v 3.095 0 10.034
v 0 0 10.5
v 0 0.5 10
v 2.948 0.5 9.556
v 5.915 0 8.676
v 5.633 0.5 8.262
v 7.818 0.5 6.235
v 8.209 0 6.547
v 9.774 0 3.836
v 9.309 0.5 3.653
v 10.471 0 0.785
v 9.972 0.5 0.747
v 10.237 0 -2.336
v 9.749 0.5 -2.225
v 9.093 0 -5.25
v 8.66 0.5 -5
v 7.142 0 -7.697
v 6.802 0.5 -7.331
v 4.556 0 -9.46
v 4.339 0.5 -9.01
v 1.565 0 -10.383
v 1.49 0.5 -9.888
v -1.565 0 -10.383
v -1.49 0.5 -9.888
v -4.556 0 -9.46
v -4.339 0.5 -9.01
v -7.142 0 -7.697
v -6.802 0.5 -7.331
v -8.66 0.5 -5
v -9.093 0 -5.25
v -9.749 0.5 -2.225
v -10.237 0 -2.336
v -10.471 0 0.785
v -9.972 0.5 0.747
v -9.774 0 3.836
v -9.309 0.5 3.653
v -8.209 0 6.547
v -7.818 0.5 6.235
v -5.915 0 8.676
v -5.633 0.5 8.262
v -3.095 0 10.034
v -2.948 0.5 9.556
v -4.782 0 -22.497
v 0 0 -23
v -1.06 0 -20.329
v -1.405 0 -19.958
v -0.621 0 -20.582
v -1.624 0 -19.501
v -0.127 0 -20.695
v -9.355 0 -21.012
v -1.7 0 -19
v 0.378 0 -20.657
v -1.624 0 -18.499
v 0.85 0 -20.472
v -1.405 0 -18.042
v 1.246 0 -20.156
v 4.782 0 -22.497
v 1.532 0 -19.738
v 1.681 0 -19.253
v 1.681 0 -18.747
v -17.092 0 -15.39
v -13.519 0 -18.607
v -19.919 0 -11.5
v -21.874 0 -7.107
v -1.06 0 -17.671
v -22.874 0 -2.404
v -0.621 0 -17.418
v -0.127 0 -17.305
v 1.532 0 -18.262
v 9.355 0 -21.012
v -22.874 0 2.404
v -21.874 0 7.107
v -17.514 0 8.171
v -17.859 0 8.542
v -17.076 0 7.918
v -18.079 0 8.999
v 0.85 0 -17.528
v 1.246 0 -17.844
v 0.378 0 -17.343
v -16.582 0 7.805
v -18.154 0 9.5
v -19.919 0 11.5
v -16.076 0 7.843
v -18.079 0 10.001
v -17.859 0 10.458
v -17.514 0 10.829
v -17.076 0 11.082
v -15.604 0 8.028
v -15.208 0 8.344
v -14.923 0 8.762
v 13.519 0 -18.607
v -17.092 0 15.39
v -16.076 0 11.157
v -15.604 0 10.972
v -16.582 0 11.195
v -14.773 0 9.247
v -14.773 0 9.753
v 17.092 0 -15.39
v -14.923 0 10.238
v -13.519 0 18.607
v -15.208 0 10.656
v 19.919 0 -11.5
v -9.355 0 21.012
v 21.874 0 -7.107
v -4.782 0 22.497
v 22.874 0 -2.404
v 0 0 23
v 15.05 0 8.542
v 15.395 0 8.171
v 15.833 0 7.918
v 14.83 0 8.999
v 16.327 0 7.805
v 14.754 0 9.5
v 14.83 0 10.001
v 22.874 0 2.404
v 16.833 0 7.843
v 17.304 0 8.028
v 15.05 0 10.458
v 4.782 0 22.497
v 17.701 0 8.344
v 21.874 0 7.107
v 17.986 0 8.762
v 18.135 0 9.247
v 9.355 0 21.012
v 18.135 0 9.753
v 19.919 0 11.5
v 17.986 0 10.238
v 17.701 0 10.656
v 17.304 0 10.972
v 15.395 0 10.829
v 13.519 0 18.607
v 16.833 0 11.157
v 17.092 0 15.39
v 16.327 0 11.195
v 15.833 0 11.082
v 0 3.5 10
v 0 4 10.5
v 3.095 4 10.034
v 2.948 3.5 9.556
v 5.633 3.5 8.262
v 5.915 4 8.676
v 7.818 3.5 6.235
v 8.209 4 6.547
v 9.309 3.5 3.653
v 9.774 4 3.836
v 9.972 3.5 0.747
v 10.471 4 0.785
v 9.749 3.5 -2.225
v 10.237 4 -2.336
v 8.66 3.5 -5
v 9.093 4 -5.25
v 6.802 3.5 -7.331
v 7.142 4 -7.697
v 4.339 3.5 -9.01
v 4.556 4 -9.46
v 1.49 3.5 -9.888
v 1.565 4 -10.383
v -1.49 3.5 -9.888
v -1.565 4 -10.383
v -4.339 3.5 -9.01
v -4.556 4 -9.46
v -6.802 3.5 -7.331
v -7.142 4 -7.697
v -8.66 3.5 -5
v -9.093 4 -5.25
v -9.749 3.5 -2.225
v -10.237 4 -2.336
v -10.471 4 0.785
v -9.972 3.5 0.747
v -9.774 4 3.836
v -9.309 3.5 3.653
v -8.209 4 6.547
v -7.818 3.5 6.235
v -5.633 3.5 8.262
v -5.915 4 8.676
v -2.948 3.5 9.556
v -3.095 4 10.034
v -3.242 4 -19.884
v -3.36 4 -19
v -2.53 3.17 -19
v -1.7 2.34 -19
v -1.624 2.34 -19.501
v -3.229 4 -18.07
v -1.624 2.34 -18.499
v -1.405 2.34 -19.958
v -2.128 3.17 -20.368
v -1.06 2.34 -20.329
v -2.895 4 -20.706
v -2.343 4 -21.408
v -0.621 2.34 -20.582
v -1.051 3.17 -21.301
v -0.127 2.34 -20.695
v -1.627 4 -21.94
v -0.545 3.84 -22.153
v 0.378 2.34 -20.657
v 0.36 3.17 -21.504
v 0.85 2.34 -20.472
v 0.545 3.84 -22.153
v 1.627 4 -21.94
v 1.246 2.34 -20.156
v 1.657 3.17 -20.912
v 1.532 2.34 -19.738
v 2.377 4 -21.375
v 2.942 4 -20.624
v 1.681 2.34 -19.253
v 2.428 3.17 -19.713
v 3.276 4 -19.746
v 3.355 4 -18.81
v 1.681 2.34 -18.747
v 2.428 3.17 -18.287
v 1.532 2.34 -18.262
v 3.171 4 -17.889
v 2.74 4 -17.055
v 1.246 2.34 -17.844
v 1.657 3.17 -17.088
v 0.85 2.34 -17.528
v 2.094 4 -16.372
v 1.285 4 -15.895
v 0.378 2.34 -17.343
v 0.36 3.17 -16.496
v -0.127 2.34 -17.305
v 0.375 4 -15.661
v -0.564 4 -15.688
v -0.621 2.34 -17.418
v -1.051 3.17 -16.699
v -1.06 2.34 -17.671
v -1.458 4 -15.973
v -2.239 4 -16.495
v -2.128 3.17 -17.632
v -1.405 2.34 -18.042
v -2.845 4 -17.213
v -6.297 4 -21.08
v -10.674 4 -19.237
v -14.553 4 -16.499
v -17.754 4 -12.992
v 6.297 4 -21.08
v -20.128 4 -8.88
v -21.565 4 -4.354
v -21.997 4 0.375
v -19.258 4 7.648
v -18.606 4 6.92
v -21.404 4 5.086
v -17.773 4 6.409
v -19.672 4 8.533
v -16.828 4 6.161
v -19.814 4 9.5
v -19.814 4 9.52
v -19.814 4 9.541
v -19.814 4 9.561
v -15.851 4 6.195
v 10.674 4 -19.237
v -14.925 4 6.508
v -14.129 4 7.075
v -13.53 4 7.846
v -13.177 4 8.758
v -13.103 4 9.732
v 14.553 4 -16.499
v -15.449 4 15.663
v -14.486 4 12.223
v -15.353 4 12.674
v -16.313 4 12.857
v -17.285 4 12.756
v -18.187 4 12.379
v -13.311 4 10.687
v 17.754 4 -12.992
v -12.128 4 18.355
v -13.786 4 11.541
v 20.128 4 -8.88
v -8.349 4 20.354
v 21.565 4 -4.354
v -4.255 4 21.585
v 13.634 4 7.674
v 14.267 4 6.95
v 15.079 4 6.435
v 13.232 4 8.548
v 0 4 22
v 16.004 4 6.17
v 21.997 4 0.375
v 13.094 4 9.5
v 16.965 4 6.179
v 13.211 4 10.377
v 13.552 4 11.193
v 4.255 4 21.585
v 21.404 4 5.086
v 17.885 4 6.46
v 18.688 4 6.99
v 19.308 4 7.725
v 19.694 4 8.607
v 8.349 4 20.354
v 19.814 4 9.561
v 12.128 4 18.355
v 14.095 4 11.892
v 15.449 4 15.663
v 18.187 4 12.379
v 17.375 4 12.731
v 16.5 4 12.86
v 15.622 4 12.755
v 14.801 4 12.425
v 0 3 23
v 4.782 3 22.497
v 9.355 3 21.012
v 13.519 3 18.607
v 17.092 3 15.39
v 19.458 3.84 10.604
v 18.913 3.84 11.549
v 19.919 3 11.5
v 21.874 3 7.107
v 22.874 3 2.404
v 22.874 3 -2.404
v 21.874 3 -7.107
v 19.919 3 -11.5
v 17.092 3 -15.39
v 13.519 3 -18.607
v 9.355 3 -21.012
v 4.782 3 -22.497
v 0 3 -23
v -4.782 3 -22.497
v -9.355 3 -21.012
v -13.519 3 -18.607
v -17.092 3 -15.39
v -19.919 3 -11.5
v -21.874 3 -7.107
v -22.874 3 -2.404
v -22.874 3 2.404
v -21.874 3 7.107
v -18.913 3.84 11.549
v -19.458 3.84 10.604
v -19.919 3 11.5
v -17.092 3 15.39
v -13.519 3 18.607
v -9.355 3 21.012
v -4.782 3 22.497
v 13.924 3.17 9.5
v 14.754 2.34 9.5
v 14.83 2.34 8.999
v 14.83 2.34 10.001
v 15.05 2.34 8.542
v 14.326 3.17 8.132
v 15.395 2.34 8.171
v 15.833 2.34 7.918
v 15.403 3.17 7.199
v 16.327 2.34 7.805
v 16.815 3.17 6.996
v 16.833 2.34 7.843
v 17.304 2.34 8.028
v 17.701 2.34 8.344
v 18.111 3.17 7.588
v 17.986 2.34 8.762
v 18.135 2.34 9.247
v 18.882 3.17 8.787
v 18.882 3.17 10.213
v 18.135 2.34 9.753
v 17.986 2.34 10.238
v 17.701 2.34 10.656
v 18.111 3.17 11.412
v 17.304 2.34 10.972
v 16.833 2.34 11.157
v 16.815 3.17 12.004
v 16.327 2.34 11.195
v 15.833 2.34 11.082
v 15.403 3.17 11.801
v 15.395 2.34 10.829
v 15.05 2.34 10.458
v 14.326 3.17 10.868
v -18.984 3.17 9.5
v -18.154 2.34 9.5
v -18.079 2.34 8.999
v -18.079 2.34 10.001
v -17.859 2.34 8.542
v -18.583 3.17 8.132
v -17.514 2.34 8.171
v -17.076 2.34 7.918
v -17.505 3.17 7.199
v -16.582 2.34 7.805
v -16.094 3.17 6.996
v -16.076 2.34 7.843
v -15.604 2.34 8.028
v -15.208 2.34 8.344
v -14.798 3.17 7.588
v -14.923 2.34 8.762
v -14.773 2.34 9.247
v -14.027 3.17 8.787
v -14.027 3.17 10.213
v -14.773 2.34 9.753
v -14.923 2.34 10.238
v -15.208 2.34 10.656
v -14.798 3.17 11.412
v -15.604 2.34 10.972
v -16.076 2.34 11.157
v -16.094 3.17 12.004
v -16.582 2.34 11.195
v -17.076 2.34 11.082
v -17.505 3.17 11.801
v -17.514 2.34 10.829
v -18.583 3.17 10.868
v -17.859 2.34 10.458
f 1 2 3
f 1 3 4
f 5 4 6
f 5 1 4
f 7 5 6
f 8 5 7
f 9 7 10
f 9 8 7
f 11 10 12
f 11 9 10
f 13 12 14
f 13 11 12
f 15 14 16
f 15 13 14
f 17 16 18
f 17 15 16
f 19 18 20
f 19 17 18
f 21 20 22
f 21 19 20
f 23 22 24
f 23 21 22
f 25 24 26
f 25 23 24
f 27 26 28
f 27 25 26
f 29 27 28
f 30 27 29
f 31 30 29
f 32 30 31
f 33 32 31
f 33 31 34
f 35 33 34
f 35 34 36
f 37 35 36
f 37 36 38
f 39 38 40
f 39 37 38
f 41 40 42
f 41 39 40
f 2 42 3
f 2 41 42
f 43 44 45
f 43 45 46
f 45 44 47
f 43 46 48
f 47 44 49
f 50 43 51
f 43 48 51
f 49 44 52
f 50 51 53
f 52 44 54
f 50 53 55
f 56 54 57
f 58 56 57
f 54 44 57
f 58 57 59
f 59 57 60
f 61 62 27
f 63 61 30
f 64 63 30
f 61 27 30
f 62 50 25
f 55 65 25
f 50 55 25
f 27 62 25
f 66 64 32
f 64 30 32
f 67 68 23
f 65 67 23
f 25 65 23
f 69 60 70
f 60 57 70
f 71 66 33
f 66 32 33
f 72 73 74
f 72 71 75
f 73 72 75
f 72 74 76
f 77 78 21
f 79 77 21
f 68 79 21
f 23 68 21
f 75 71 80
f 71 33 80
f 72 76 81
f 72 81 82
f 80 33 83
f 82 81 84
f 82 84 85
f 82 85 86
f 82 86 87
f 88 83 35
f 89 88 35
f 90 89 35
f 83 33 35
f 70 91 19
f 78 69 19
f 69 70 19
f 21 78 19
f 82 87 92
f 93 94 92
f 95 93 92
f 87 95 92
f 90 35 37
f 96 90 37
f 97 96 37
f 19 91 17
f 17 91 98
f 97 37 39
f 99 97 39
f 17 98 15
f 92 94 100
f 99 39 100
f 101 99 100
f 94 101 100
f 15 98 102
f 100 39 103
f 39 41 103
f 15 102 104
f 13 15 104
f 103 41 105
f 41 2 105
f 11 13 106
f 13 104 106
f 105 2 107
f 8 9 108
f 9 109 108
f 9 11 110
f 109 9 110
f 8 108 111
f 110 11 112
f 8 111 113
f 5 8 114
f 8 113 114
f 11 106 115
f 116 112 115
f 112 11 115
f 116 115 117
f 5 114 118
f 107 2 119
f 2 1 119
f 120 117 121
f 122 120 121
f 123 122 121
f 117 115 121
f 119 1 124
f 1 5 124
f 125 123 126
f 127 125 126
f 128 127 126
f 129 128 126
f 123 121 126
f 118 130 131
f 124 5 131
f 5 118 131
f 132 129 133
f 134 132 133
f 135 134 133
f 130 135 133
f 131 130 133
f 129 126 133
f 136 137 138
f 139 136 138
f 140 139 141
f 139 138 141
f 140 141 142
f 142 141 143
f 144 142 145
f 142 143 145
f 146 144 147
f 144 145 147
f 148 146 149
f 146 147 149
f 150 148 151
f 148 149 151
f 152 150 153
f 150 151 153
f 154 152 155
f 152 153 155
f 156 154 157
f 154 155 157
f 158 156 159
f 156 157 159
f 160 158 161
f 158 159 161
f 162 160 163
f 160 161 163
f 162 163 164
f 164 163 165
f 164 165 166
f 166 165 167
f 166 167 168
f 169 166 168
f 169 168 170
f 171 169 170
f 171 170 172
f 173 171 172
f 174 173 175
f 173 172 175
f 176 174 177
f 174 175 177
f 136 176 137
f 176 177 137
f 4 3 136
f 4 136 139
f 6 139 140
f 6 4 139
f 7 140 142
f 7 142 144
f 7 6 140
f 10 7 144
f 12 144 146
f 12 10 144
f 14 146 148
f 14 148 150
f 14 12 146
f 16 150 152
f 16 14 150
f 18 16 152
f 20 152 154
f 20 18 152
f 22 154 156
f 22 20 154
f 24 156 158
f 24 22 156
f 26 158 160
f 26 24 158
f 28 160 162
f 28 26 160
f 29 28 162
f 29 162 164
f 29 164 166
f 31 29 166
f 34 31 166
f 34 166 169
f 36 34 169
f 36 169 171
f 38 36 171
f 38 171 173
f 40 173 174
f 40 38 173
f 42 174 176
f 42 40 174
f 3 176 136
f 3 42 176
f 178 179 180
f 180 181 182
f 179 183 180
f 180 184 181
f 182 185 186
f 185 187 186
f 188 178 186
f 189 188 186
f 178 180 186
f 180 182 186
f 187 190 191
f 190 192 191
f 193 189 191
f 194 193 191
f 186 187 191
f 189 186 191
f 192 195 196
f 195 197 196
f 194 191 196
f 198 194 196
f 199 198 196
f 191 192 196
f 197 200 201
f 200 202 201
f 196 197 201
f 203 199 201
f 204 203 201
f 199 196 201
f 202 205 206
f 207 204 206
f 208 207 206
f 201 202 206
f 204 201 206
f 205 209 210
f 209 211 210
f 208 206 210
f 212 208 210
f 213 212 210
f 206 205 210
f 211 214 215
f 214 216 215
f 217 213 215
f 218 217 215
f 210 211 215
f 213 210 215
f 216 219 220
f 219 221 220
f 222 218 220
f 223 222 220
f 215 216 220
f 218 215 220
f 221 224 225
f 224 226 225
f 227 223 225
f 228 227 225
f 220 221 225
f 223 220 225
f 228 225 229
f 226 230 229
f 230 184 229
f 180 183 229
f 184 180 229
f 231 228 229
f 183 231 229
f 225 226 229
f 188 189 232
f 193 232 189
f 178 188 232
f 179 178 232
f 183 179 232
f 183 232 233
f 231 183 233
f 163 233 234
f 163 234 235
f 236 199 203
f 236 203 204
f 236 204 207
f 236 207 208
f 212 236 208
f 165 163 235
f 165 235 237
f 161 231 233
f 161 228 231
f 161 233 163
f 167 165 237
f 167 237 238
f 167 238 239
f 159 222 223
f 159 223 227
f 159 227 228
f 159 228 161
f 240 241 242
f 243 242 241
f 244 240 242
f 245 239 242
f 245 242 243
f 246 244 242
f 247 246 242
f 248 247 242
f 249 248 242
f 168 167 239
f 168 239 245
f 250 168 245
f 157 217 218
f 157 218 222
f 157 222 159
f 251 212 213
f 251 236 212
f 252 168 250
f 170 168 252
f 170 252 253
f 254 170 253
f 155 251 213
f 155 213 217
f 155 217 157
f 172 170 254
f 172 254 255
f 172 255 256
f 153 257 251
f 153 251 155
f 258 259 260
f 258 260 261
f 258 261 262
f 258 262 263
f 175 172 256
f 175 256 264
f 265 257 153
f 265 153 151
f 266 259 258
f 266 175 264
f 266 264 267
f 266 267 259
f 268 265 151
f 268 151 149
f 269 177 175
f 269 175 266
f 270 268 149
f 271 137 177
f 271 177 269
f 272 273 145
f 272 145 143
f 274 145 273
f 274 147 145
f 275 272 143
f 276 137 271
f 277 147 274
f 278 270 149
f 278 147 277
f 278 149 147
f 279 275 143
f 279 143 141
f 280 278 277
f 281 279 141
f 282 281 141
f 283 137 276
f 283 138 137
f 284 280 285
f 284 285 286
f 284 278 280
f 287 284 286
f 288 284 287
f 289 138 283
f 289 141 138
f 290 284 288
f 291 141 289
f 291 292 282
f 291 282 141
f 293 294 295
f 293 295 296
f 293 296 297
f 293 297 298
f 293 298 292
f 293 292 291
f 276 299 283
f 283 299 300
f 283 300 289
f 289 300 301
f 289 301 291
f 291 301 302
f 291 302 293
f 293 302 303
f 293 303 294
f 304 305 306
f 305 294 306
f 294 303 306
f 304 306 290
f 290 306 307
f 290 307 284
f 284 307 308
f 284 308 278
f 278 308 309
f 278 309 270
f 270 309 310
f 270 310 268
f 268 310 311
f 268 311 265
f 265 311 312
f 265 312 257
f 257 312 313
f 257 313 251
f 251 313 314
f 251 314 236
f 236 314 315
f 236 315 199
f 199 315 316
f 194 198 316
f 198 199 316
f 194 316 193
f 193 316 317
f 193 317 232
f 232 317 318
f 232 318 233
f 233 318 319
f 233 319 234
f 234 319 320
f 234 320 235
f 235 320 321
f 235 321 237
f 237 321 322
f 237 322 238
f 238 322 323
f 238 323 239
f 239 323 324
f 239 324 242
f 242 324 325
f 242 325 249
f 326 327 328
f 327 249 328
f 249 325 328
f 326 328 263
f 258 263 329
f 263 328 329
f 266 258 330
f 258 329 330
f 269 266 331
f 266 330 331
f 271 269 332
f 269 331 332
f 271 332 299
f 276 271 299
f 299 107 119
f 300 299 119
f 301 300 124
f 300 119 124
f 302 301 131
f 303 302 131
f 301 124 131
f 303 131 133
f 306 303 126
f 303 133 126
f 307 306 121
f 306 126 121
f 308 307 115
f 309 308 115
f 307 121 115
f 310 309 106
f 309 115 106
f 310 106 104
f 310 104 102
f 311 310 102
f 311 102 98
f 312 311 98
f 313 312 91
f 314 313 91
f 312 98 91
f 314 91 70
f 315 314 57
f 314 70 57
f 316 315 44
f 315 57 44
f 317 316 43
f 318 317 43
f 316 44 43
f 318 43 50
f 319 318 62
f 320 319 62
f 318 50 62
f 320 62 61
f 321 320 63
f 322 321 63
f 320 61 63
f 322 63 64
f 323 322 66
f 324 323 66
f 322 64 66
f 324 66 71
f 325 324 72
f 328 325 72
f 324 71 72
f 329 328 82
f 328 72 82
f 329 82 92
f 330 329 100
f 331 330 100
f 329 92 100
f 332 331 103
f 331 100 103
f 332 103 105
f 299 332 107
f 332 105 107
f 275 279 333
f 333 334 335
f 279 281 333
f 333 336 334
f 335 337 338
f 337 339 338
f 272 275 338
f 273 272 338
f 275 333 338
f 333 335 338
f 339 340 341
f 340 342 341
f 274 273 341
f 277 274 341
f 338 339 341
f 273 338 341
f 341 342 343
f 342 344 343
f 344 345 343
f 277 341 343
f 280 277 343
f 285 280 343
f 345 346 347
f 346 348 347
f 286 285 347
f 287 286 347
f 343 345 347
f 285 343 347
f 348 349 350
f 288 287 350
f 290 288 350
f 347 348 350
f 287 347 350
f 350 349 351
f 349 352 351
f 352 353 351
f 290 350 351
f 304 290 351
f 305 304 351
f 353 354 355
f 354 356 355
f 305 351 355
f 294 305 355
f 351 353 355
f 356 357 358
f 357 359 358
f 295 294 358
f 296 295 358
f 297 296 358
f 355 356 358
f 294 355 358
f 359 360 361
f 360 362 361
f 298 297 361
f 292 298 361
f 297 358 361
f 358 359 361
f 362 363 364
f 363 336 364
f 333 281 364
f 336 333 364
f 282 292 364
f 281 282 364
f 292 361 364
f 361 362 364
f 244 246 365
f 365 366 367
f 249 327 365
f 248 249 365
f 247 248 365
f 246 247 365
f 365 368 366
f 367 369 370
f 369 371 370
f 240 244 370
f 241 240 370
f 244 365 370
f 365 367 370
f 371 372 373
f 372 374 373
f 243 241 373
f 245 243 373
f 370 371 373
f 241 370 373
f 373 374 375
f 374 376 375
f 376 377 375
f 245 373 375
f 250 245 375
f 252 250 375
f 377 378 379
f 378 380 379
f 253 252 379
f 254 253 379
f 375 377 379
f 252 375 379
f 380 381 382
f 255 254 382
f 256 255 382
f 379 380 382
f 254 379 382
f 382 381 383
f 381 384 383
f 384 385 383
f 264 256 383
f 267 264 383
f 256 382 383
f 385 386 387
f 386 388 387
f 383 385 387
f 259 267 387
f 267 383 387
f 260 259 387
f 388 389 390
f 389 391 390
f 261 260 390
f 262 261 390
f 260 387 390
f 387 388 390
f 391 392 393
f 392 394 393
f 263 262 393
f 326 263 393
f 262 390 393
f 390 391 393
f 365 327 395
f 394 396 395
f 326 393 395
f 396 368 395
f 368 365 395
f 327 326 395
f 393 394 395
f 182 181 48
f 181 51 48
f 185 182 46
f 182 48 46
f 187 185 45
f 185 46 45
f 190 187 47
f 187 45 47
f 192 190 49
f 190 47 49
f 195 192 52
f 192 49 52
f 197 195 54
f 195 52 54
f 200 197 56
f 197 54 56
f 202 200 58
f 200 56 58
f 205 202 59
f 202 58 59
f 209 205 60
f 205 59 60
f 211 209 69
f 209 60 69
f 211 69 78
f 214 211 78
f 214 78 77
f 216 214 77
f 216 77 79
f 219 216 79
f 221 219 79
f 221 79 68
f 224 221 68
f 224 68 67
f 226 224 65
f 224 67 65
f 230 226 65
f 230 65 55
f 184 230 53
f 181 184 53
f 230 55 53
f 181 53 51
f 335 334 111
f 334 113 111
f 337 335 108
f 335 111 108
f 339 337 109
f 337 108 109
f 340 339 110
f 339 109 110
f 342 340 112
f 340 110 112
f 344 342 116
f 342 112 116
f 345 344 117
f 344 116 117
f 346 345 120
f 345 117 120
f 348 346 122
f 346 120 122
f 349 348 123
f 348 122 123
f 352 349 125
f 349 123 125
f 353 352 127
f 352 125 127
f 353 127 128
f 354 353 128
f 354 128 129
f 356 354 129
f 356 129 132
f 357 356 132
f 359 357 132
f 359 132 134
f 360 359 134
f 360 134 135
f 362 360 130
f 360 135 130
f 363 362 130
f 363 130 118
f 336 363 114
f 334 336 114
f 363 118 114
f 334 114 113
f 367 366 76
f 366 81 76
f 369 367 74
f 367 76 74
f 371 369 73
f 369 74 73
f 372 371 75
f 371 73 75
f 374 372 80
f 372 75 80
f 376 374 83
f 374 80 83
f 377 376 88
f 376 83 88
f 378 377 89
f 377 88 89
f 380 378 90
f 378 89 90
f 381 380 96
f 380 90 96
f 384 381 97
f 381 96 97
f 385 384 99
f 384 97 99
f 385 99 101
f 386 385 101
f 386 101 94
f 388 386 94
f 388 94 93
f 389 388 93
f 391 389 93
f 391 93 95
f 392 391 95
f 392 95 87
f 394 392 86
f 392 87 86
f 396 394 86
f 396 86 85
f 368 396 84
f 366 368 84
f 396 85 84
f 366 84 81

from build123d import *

# Parameters (mm, degrees)
SKETCH1_R                     = 23
SKETCH1_R_2                   = 10
BOSS_EXTRUDE1_DEPTH           = 4
CHAMFER1_SIZE                 = 0.5
CHAMFER2_SIZE                 = 1
CSK_FOR_M3_SFHCS1_D           = 3.4
CSK_FOR_M3_SFHCS1_CSINK_D     = 6.72
CSK_FOR_M3_SFHCS1_CSINK_ANGLE = 90


with BuildPart() as part:
    # Sketch1 → Boss-Extrude1 (new body)
    with BuildSketch(Plane(origin=(0, 0, 0), x_dir=(1, 0, 0), z_dir=(0, 1, 0))):
        with Locations(Location((0, 0, 0), (0, 0, 270))):
            Circle(SKETCH1_R)
        with Locations(Location((0, 0, 0), (0, 0, 270))):
            Circle(SKETCH1_R_2, mode=Mode.SUBTRACT)
    extrude(amount=BOSS_EXTRUDE1_DEPTH)

    # Chamfer1
    chamfer1_edges = [part.edges().sort_by_distance(p)[0] for p in [
        (0, 0, -10),
        (0, 4, -10),
    ]]
    chamfer(chamfer1_edges, length=CHAMFER1_SIZE)

    # Chamfer2
    chamfer2_edges = [part.edges().sort_by_distance(p)[0] for p in [
        (0, 4, -23),
    ]]
    chamfer(chamfer2_edges, length=CHAMFER2_SIZE)

    # CSK for M3 SFHCS1 (through all)
    with Locations(Plane(origin=(0, 4, 0), x_dir=(1, 0, 0), z_dir=(0, 1, 0))):
        with Locations((0, 19), (16.454482672, -9.5), (-16.454482672, -9.5)):
            CounterSinkHole(CSK_FOR_M3_SFHCS1_D / 2, CSK_FOR_M3_SFHCS1_CSINK_D / 2, counter_sink_angle=CSK_FOR_M3_SFHCS1_CSINK_ANGLE)


solid = part.part
